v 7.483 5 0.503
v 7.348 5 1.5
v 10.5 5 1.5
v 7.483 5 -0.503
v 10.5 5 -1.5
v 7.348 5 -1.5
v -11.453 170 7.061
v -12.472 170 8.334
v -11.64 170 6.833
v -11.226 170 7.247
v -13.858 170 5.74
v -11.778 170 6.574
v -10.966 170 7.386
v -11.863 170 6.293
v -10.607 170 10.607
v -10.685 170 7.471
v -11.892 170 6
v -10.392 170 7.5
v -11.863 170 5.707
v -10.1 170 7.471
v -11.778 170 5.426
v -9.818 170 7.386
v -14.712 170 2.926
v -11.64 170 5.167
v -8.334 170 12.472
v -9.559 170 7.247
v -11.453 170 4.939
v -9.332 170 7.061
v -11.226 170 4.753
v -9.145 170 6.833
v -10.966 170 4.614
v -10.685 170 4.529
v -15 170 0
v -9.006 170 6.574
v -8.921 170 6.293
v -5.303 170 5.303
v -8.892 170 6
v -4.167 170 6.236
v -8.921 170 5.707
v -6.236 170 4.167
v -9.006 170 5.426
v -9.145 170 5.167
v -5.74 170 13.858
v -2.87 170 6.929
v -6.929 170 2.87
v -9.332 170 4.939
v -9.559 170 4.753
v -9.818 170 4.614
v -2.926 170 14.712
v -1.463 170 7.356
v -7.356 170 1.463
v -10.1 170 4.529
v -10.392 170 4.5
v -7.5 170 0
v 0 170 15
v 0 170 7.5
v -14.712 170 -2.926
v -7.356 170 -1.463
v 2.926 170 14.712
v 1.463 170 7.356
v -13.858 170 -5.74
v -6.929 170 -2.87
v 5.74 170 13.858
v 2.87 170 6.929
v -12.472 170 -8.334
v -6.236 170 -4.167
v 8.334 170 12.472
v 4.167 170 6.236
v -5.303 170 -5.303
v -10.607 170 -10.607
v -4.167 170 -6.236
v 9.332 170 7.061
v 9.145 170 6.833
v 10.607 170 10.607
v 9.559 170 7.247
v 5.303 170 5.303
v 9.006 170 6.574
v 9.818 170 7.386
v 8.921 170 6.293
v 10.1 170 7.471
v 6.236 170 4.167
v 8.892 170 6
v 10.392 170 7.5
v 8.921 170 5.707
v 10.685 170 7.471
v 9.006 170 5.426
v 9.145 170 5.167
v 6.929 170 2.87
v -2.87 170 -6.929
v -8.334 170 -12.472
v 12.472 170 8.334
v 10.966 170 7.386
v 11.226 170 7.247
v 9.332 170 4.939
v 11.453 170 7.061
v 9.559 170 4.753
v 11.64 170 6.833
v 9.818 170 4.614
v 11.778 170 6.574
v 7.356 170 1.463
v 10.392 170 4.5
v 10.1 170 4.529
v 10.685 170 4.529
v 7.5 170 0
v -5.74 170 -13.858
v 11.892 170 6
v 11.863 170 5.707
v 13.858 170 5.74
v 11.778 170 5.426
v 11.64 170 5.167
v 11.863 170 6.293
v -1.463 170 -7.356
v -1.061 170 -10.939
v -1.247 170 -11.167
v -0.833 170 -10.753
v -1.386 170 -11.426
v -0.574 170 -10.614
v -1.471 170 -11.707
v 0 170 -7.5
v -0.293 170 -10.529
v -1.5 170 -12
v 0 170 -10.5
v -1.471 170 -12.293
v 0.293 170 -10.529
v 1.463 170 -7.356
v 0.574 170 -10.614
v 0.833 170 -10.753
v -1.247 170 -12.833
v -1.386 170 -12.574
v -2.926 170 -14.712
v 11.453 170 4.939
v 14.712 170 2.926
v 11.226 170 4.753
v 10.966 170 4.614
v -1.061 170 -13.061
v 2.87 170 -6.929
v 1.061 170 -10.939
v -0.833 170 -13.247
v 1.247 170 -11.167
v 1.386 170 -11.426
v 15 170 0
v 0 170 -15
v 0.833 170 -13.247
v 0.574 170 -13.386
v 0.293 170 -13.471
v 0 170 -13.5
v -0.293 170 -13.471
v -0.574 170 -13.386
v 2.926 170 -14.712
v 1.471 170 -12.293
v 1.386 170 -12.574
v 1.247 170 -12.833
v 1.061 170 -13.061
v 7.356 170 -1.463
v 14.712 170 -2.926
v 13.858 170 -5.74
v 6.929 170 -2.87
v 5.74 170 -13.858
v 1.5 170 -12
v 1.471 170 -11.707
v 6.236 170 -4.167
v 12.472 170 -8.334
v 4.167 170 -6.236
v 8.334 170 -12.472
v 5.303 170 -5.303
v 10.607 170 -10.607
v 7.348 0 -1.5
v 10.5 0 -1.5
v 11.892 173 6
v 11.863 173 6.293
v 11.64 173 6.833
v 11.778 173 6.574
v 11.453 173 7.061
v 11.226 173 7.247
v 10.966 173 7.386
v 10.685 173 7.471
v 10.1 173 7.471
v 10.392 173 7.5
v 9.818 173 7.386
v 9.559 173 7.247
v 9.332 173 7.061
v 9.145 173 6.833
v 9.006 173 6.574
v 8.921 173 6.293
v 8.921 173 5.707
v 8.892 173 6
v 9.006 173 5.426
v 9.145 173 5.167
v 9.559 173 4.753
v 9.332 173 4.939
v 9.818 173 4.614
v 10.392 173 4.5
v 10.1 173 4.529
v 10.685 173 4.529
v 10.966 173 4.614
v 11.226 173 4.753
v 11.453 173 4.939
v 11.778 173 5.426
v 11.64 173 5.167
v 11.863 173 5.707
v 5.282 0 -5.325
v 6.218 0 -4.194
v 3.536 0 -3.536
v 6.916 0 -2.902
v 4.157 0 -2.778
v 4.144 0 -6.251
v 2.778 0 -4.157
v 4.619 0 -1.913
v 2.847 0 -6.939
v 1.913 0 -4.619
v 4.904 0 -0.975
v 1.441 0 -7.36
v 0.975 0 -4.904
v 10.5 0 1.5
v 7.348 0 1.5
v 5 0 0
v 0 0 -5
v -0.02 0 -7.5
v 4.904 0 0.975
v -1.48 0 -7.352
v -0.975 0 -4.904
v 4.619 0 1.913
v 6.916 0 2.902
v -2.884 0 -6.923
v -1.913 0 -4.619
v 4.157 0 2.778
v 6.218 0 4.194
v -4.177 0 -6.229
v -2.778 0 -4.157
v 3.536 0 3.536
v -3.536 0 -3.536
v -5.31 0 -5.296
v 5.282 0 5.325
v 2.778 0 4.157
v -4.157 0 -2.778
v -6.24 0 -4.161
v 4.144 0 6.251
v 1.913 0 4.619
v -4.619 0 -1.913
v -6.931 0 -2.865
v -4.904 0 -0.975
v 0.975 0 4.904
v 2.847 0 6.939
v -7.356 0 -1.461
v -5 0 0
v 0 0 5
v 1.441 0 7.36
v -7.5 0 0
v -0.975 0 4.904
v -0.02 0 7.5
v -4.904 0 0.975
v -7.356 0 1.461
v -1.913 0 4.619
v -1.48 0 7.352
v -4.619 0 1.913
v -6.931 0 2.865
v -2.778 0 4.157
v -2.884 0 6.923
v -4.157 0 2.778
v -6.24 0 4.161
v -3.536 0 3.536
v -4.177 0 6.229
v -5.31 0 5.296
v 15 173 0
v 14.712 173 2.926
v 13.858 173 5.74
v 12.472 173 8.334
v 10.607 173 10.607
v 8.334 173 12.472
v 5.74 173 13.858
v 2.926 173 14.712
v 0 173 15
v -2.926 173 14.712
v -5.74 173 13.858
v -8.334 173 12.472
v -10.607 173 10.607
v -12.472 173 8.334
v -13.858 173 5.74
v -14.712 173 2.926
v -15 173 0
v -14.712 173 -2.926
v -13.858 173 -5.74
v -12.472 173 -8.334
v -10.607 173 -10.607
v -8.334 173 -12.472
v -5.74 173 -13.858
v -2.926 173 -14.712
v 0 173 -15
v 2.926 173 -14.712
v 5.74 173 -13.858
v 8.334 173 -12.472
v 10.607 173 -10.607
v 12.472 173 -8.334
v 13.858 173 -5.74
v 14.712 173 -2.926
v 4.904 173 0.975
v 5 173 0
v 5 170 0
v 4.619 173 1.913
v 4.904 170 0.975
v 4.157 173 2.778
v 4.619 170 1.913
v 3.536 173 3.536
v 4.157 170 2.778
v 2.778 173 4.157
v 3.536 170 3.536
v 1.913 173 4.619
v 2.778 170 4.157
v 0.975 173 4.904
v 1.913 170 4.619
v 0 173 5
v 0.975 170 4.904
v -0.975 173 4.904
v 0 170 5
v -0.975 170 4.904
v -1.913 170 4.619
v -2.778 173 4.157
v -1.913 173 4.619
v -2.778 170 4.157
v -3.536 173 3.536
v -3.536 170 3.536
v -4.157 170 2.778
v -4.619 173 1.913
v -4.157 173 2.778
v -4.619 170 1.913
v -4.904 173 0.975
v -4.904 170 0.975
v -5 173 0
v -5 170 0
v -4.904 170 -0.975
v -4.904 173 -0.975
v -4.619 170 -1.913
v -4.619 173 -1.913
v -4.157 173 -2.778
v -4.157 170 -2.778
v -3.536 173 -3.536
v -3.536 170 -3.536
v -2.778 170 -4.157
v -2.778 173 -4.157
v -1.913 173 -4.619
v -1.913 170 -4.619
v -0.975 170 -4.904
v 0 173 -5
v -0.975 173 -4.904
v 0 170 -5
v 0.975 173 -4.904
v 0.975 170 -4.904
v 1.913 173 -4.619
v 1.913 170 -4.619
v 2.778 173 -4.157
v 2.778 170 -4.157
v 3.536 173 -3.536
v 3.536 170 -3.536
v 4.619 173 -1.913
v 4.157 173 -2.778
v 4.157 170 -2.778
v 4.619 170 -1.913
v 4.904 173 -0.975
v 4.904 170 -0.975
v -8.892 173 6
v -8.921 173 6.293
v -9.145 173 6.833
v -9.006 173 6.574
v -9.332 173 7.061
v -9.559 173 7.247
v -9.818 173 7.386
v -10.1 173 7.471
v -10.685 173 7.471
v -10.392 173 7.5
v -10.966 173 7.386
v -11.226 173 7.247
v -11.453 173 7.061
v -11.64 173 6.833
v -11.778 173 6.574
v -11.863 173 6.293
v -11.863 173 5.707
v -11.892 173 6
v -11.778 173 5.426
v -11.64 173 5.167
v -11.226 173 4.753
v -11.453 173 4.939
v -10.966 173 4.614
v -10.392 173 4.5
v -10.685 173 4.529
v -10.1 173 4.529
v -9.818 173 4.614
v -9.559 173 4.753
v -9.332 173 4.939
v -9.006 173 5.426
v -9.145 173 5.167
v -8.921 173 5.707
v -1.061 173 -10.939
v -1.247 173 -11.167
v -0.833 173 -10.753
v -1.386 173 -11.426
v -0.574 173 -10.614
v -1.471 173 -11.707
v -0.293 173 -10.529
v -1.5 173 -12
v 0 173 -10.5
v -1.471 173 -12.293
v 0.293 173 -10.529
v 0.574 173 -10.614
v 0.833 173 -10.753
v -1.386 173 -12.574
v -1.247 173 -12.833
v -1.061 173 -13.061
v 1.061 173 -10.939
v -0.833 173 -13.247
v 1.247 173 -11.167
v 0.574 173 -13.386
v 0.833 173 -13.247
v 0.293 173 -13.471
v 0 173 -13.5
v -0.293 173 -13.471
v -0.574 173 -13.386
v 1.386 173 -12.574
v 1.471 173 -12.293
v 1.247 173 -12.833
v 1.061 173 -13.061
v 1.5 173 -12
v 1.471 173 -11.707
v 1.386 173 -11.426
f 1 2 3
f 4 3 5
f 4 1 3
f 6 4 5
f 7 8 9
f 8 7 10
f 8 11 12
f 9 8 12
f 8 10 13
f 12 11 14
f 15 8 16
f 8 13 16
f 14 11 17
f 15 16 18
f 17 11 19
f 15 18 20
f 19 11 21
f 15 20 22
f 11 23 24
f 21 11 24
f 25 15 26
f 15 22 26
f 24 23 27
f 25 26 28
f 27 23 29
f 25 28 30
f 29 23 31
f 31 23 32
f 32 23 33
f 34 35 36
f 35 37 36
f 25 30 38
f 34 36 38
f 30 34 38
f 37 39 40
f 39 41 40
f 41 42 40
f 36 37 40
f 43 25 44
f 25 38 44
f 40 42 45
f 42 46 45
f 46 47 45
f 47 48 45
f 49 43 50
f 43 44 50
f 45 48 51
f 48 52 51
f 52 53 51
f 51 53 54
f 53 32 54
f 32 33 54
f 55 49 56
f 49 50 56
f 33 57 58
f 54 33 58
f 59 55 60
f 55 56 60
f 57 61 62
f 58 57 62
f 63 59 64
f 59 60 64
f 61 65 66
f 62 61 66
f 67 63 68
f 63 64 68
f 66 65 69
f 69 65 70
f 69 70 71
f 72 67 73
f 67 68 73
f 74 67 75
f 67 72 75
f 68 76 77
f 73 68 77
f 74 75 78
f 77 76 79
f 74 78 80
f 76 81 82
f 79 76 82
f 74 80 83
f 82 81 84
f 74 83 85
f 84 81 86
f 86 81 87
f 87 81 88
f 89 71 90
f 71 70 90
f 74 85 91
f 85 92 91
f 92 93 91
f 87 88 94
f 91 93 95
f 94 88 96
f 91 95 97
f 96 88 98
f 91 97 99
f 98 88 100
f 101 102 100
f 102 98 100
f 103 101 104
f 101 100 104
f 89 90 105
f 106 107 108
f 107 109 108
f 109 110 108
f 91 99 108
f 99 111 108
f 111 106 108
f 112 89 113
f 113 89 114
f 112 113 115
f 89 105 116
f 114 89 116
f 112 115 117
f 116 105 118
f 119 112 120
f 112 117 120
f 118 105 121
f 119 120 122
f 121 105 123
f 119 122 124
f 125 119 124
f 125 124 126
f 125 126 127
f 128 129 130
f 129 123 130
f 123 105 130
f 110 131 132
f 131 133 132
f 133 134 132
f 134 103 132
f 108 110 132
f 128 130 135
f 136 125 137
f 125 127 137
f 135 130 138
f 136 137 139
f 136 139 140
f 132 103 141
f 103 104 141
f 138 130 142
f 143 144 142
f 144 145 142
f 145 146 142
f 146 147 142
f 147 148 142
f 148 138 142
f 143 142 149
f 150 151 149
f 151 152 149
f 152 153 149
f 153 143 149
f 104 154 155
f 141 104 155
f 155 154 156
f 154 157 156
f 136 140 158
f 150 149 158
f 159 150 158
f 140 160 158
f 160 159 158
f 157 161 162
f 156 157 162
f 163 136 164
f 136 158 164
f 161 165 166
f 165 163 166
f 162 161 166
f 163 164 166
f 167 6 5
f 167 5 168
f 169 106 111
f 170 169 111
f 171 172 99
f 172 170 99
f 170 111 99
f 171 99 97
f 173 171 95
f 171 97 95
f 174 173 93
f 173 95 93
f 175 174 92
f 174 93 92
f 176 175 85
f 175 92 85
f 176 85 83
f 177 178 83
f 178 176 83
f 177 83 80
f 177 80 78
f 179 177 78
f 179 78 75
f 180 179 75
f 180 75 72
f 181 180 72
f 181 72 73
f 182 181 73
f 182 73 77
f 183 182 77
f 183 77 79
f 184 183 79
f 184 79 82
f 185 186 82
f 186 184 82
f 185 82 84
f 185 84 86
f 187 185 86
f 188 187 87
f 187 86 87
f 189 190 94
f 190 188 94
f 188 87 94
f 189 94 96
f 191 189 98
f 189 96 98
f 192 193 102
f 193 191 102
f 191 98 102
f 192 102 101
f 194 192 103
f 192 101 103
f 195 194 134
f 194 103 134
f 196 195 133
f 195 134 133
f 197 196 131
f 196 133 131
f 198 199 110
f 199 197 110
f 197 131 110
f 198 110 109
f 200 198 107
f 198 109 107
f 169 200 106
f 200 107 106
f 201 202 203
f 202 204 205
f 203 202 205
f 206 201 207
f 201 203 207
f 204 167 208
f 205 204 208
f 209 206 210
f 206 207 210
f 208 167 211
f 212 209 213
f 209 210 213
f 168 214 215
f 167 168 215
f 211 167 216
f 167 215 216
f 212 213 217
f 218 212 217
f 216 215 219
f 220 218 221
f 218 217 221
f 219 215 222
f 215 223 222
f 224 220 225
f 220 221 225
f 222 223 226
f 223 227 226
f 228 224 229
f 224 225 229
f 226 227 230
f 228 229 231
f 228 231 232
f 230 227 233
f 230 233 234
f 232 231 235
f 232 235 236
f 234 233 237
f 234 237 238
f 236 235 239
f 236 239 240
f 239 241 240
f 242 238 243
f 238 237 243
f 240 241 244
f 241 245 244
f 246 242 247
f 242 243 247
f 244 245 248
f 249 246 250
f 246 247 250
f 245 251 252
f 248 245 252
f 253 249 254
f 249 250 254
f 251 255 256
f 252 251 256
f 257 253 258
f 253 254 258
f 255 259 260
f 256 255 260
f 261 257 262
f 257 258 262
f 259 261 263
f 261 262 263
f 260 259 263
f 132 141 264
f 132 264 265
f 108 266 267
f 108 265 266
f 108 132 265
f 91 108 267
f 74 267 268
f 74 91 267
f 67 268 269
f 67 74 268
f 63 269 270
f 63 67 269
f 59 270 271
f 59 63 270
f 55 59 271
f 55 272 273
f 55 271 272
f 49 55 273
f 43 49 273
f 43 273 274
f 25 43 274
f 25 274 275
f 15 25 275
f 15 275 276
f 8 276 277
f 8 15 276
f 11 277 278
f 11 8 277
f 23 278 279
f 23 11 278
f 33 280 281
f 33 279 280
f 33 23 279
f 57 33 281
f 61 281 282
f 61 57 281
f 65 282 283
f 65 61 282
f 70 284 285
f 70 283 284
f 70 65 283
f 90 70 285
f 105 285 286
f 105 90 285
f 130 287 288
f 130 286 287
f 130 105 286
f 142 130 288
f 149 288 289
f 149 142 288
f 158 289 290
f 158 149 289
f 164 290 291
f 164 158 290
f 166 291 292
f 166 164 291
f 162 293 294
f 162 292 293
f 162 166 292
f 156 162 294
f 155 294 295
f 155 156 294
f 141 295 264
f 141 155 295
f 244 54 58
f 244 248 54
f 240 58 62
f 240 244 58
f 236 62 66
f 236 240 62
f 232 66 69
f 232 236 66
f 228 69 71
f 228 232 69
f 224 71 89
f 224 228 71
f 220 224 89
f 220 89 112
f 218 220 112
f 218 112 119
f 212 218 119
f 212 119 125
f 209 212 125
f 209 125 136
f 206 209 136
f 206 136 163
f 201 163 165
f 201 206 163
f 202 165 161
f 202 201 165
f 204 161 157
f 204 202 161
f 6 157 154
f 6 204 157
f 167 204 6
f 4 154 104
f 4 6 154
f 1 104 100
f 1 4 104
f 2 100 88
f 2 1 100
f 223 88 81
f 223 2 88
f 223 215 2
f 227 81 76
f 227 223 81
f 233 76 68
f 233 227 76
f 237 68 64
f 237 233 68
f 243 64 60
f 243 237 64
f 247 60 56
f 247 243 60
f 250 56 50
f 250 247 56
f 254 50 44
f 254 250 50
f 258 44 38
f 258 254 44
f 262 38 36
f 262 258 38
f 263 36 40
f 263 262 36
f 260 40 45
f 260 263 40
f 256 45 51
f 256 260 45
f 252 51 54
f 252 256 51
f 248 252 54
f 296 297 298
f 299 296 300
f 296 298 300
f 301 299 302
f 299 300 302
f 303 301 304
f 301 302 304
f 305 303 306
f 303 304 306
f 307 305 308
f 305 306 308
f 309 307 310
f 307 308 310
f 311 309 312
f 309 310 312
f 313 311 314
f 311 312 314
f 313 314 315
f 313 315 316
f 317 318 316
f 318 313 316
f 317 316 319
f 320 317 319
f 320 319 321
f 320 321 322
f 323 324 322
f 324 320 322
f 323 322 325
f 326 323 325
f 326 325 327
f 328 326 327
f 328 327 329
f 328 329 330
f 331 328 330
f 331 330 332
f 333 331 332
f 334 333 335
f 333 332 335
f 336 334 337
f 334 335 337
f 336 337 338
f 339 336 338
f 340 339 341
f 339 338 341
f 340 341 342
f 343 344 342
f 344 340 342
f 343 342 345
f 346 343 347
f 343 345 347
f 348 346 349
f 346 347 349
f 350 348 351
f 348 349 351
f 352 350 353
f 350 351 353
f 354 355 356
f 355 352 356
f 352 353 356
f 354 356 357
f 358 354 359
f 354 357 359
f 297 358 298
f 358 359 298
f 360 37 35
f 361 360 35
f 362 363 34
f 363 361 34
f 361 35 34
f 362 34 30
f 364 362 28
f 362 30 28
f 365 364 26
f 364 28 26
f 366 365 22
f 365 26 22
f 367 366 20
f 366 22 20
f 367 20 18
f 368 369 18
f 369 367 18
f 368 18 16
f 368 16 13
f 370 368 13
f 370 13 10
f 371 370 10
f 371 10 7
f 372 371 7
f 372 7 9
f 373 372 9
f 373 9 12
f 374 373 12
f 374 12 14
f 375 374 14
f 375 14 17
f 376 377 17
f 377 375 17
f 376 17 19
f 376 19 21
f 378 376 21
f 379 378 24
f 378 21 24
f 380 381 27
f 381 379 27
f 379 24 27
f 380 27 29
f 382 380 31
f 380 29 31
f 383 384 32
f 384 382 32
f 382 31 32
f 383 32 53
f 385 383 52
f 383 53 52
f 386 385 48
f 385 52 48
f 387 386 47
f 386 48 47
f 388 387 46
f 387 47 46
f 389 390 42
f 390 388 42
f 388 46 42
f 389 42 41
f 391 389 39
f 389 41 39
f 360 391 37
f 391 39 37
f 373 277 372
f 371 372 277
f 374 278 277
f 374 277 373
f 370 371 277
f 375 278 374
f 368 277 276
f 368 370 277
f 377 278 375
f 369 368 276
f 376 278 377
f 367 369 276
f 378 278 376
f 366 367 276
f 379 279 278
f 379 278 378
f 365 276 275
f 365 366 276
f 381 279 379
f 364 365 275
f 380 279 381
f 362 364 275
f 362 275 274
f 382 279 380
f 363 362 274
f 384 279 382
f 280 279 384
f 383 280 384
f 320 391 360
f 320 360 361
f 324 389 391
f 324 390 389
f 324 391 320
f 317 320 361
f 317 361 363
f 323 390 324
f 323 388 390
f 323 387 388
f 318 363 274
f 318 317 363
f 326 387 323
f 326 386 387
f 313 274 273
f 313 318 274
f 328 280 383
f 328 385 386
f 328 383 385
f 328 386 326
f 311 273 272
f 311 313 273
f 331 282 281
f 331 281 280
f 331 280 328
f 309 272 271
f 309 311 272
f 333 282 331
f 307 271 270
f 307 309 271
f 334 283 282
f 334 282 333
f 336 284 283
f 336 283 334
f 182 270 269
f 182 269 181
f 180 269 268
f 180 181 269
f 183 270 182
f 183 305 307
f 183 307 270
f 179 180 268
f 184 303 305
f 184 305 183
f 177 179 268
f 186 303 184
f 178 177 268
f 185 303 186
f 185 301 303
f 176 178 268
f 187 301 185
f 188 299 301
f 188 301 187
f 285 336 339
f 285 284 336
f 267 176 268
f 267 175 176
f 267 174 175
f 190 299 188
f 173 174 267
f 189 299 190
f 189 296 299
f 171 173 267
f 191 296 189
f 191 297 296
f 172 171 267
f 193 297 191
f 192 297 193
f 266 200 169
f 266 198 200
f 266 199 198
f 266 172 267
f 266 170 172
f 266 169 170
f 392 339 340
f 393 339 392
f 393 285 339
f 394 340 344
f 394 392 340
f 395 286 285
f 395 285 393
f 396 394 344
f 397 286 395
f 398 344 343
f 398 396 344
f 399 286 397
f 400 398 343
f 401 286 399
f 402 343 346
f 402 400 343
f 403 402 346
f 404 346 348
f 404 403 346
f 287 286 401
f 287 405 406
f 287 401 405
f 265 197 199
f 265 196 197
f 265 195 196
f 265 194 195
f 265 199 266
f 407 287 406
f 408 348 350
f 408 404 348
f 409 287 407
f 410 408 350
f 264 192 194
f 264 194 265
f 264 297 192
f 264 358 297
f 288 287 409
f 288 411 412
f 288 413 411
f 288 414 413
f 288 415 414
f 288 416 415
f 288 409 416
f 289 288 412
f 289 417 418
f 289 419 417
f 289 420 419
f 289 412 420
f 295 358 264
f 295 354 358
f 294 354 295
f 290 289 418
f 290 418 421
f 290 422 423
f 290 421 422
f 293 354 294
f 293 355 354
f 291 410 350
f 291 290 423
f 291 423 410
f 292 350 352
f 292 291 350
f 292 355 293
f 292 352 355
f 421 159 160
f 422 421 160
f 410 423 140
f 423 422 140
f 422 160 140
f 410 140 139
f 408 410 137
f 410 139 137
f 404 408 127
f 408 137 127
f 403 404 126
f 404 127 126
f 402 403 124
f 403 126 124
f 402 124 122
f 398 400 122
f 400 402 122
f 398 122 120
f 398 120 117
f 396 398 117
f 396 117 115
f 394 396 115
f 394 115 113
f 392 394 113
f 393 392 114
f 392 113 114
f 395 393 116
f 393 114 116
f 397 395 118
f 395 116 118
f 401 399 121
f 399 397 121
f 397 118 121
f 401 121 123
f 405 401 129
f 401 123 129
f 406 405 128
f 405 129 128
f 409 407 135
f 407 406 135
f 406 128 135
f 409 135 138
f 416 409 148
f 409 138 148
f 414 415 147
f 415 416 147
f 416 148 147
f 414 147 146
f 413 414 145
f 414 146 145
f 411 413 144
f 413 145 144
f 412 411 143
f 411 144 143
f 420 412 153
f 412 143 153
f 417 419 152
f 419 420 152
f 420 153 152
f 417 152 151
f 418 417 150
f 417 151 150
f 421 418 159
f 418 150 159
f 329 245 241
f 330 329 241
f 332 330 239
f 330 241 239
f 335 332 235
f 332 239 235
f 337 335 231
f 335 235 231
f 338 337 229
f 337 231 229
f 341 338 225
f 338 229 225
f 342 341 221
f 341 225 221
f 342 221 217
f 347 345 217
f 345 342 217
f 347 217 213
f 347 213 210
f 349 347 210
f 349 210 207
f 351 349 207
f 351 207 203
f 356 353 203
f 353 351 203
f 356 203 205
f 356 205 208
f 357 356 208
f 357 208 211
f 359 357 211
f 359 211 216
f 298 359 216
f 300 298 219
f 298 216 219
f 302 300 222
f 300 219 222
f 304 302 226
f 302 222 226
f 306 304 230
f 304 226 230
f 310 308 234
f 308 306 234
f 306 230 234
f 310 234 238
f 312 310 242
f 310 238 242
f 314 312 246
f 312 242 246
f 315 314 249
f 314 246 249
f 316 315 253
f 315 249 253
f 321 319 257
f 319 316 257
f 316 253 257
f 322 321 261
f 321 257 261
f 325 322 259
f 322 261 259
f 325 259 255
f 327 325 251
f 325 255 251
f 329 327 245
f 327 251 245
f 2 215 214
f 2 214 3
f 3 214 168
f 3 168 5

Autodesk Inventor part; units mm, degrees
ref_plane "XZ Plane" through (0, 0, 0) normal (0, 1, 0) x (-1, 0, 0)
ref_plane "XY Plane" through (0, 0, 0) normal (0, 0, 1) x (1, 0, 0)
sketch "Sketch1" plane through (0, 0, 0) normal (0, 1, 0) x (-1, 0, 0)
  circle A0 centre (0, 0) radius 7.5
  circle A1 centre (0, 0) radius 5
  dimension "d0" = 2.5
  dimension "d1" = 15
extrude "Extrusion1" add sketch "Sketch1" along normal blind 170
ref_plane "Work Plane1" through (7.5, 0, 0) normal (1, 0, 0) x (0, 1, 0)
sketch "Sketch2" plane through (7.5, 0, 0) normal (1, 0, 0) x (0, 1, 0)
  line L0 (0, -7.5) -> (0, 7.5) projected
  line L1 (0, -1.5) -> (0, 1.5)
  line L2 (0, 1.5) -> (5, 1.5)
  line L3 (5, 1.5) -> (5, -1.5)
  line L4 (5, -1.5) -> (0, -1.5)
  point P0 (0, 0)
  dimension "d4" = 1.5
  dimension "d5" = 1.5
  dimension "d6" = 5
extrude "Extrusion2" add sketch "Sketch2" along normal blind 3 and the other way blind 1.5
sketch "Sketch4" plane through (0, 170, 0) normal (0, 1, 0) x (1, 0, 0)
  circle A0 centre (0, 0) radius 15
  circle A1 centre (0, 0) radius 5 projected
  circle A2 centre (0, 12) radius 1.5
  circle A3 centre (-10.3923, -6) radius 1.5
  circle A4 centre (10.3923, -6) radius 1.5
  dimension "d11" = 30
  dimension "d12" = 12
  dimension "d13" = 3
  dimension "d16" = 360
extrude "Extrusion3" add sketch "Sketch4" along normal blind 3
properties part number "15"
